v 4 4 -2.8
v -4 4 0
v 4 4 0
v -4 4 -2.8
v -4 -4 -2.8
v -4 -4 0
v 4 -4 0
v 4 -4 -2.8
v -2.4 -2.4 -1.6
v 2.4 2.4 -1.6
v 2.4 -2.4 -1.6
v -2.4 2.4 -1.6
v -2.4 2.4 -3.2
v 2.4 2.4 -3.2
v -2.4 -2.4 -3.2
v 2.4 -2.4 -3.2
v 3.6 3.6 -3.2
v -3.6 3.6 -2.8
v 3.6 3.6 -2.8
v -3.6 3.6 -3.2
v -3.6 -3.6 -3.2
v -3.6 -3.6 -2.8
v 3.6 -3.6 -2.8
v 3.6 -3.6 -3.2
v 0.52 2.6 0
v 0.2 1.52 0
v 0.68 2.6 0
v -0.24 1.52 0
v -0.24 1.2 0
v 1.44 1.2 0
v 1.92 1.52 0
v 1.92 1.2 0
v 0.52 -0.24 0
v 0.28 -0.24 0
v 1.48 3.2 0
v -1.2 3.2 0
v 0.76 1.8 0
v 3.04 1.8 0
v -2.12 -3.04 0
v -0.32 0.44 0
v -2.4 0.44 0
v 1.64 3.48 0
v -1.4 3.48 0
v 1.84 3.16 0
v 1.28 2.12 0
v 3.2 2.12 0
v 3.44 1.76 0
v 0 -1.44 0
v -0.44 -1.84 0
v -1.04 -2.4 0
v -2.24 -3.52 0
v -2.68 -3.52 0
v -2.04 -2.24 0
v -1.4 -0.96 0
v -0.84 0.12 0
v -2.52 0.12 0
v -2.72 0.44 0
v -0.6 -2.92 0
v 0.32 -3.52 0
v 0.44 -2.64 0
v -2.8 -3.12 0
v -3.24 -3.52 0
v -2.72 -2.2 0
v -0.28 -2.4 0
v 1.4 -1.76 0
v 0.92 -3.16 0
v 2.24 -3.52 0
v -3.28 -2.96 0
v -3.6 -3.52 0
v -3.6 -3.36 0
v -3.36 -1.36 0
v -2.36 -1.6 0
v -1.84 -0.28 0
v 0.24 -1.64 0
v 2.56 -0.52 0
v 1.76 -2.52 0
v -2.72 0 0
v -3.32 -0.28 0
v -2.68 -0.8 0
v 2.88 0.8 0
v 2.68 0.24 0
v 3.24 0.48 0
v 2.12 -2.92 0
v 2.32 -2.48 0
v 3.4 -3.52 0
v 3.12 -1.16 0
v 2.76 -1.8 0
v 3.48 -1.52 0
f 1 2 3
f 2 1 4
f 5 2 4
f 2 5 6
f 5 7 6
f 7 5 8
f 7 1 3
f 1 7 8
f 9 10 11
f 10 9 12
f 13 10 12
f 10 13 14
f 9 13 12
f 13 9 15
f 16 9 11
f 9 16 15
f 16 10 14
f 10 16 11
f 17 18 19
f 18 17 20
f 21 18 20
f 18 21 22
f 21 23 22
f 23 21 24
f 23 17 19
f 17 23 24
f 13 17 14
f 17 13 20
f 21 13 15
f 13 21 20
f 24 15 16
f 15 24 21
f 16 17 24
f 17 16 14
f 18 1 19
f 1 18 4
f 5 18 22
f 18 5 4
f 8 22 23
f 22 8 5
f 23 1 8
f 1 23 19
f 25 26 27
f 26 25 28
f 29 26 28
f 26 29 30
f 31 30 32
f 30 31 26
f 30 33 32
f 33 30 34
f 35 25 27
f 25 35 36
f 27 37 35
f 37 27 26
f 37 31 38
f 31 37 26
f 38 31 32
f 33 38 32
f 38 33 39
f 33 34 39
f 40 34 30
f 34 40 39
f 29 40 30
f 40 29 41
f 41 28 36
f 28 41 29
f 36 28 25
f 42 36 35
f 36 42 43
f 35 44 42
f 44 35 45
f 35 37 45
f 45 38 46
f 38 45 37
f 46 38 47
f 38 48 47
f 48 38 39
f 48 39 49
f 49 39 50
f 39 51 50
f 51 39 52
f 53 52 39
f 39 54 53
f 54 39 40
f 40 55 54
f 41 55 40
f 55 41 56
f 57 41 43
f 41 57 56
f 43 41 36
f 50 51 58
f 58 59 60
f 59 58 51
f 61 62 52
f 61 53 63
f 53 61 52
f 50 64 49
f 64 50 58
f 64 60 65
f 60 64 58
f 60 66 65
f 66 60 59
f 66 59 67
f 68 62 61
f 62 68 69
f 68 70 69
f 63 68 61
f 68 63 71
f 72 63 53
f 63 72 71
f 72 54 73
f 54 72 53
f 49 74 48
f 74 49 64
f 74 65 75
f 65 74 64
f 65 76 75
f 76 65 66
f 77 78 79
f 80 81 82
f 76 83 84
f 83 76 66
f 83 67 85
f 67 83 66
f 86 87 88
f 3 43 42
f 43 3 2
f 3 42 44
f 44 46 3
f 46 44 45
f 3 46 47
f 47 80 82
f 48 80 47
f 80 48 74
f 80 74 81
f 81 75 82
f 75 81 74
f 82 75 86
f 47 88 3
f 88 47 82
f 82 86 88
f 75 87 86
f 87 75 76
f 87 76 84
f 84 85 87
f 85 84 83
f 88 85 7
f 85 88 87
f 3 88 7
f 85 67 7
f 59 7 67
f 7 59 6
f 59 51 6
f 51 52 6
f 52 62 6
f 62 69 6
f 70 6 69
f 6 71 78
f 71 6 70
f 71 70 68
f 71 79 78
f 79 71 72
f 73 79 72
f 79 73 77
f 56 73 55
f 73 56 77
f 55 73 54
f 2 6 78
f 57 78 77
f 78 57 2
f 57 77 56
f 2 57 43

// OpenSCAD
// file: ../p/box5.scad
use <../lib.scad>
function ldraw_lib__box5() = [
// 0 Box with 5 Faces and All Edges
// 0 Name: box5.dat
// 0 Author: James Jessiman
// 0 !LDRAW_ORG Primitive UPDATE 2012-01
// 0 !LICENSE Licensed under CC BY 4.0 : see CAreadme.txt
// 
// 0 BFC CERTIFY CCW
  [0,"BFC","CERTIFY"],
  [0,"BFC","CCW"],
// 
// 0 !HISTORY 2002-04-03 [sbliss] Modified for BFC compliance
// 0 !HISTORY 2002-04-25 [PTadmin] Official Update 2002-02
// 0 !HISTORY 2007-06-24 [PTadmin] Header formatted for Contributor Agreement
// 0 !HISTORY 2008-07-01 [PTadmin] Official Update 2008-01
// 0 !HISTORY 2012-02-16 [Philo] Changed to CCW
// 0 !HISTORY 2012-03-30 [PTadmin] Official Update 2012-01
// 
// 
// 2 24 1 1 1 -1 1 1
  [2,24,1,1,1,-1,1,1],
// 2 24 -1 1 1 -1 1 -1
  [2,24,-1,1,1,-1,1,-1],
// 2 24 -1 1 -1 1 1 -1
  [2,24,-1,1,-1,1,1,-1],
// 2 24 1 1 -1 1 1 1
  [2,24,1,1,-1,1,1,1],
// 2 24 1 0 1 -1 0 1
  [2,24,1,0,1,-1,0,1],
// 2 24 -1 0 1 -1 0 -1
  [2,24,-1,0,1,-1,0,-1],
// 2 24 -1 0 -1 1 0 -1
  [2,24,-1,0,-1,1,0,-1],
// 2 24 1 0 -1 1 0 1
  [2,24,1,0,-1,1,0,1],
// 2 24 1 0 1 1 1 1
  [2,24,1,0,1,1,1,1],
// 2 24 -1 0 1 -1 1 1
  [2,24,-1,0,1,-1,1,1],
// 2 24 1 0 -1 1 1 -1
  [2,24,1,0,-1,1,1,-1],
// 2 24 -1 0 -1 -1 1 -1
  [2,24,-1,0,-1,-1,1,-1],
// 4 16 -1 1 1 1 1 1 1 1 -1 -1 1 -1
  [4,16,-1,1,1,1,1,1,1,1,-1,-1,1,-1],
// 4 16 -1 1 1 -1 0 1 1 0 1 1 1 1
  [4,16,-1,1,1,-1,0,1,1,0,1,1,1,1],
// 4 16 -1 1 -1 -1 0 -1 -1 0 1 -1 1 1
  [4,16,-1,1,-1,-1,0,-1,-1,0,1,-1,1,1],
// 4 16 1 1 -1 1 0 -1 -1 0 -1 -1 1 -1
  [4,16,1,1,-1,1,0,-1,-1,0,-1,-1,1,-1],
// 4 16 1 1 1 1 0 1 1 0 -1 1 1 -1
  [4,16,1,1,1,1,0,1,1,0,-1,1,1,-1],
];
module ldraw_lib__box5(step=0, col=false, unit=2/5, alt=false, line=0.2, solid=!$preview)
    makepoly(ldraw_lib__box5(), step=step, col=col, unit=unit, alt=alt, line=line, solid=solid);
ldraw_lib__box5(line=0.2);
// file: ../p/box4.scad
use <../lib.scad>
function ldraw_lib__box4() = [
// 0 Box with 4 Faces (2 Parallel Pairs) and All Edges
// 0 Name: box4.dat
// 0 Author: James Jessiman
// 0 !LDRAW_ORG Primitive UPDATE 2012-01
// 0 !LICENSE Licensed under CC BY 4.0 : see CAreadme.txt
// 
// 0 BFC CERTIFY CCW
  [0,"BFC","CERTIFY"],
  [0,"BFC","CCW"],
// 
// 0 !HISTORY 2002-04-03 [sbliss] Modified for BFC compliance
// 0 !HISTORY 2002-04-25 [PTadmin] Official Update 2002-02
// 0 !HISTORY 2007-06-24 [PTadmin] Header formatted for Contributor Agreement
// 0 !HISTORY 2008-07-01 [PTadmin] Official Update 2008-01
// 0 !HISTORY 2012-02-16 [Philo] Changed to CCW
// 0 !HISTORY 2012-03-30 [PTadmin] Official Update 2012-01
// 
// 
// 2 24 1 1 1 -1 1 1
  [2,24,1,1,1,-1,1,1],
// 2 24 -1 1 1 -1 1 -1
  [2,24,-1,1,1,-1,1,-1],
// 2 24 -1 1 -1 1 1 -1
  [2,24,-1,1,-1,1,1,-1],
// 2 24 1 1 -1 1 1 1
  [2,24,1,1,-1,1,1,1],
// 2 24 1 0 1 -1 0 1
  [2,24,1,0,1,-1,0,1],
// 2 24 -1 0 1 -1 0 -1
  [2,24,-1,0,1,-1,0,-1],
// 2 24 -1 0 -1 1 0 -1
  [2,24,-1,0,-1,1,0,-1],
// 2 24 1 0 -1 1 0 1
  [2,24,1,0,-1,1,0,1],
// 2 24 1 0 1 1 1 1
  [2,24,1,0,1,1,1,1],
// 2 24 -1 0 1 -1 1 1
  [2,24,-1,0,1,-1,1,1],
// 2 24 1 0 -1 1 1 -1
  [2,24,1,0,-1,1,1,-1],
// 2 24 -1 0 -1 -1 1 -1
  [2,24,-1,0,-1,-1,1,-1],
// 4 16 -1 1 1 -1 0 1 1 0 1 1 1 1
  [4,16,-1,1,1,-1,0,1,1,0,1,1,1,1],
// 4 16 -1 1 -1 -1 0 -1 -1 0 1 -1 1 1
  [4,16,-1,1,-1,-1,0,-1,-1,0,1,-1,1,1],
// 4 16 1 1 -1 1 0 -1 -1 0 -1 -1 1 -1
  [4,16,1,1,-1,1,0,-1,-1,0,-1,-1,1,-1],
// 4 16 1 1 1 1 0 1 1 0 -1 1 1 -1
  [4,16,1,1,1,1,0,1,1,0,-1,1,1,-1],
];
module ldraw_lib__box4(step=0, col=false, unit=2/5, alt=false, line=0.2, solid=!$preview)
    makepoly(ldraw_lib__box4(), step=step, col=col, unit=unit, alt=alt, line=line, solid=solid);
ldraw_lib__box4(line=0.2);
// file: s/3070bs01.scad
use <../../lib.scad>
use <../../p/box4.scad>
use <../../p/box5.scad>
function ldraw_lib__s__3070bs01() = [
// 0 ~Tile  1 x  1 with Groove without Top Face
// 0 Name: s\3070bs01.dat
// 0 Author: Chris Dee [cwdee]
// 0 !LDRAW_ORG Subpart UPDATE 2009-02
// 0 !LICENSE Licensed under CC BY 4.0 : see CAreadme.txt
// 
// 0 BFC CERTIFY CCW
  [0,"BFC","CERTIFY"],
  [0,"BFC","CCW"],
// 
// 0 !HISTORY 2009-09-03 [PTadmin] Official Update 2009-02
// 
// 
// 1 16 0 0 0 10 0 0 0 7 0 0 0 10 box4.dat
  [1,16,0,0,0,10,0,0,0,7,0,0,0,10, ldraw_lib__box4()],
// 0 BFC INVERTNEXT
  [0,"BFC","INVERTNEXT"],
// 1 16 0 8 0 6 0 0 0 -4 0 0 0 6 box5.dat
  [1,16,0,8,0,6,0,0,0,-4,0,0,0,6, ldraw_lib__box5()],
// 1 16 0 7 0 9 0 0 0 1 0 0 0 9 box4.dat
  [1,16,0,7,0,9,0,0,0,1,0,0,0,9, ldraw_lib__box4()],
// 
// 4 16 9 8 9 6 8 6 -6 8 6 -9 8 9
  [4,16,9,8,9,6,8,6,-6,8,6,-9,8,9],
// 4 16 -9 8 9 -6 8 6 -6 8 -6 -9 8 -9
  [4,16,-9,8,9,-6,8,6,-6,8,-6,-9,8,-9],
// 4 16 -9 8 -9 -6 8 -6 6 8 -6 9 8 -9
  [4,16,-9,8,-9,-6,8,-6,6,8,-6,9,8,-9],
// 4 16 9 8 -9 6 8 -6 6 8 6 9 8 9
  [4,16,9,8,-9,6,8,-6,6,8,6,9,8,9],
// 
// 4 16 10 7 10 9 7 9 -9 7 9 -10 7 10
  [4,16,10,7,10,9,7,9,-9,7,9,-10,7,10],
// 4 16 -10 7 10 -9 7 9 -9 7 -9 -10 7 -10
  [4,16,-10,7,10,-9,7,9,-9,7,-9,-10,7,-10],
// 4 16 -10 7 -10 -9 7 -9 9 7 -9 10 7 -10
  [4,16,-10,7,-10,-9,7,-9,9,7,-9,10,7,-10],
// 4 16 10 7 -10 9 7 -9 9 7 9 10 7 10
  [4,16,10,7,-10,9,7,-9,9,7,9,10,7,10],
// 0
];
module ldraw_lib__s__3070bs01(step=0, col=false, unit=2/5, alt=false, line=0.2, solid=!$preview)
    makepoly(ldraw_lib__s__3070bs01(), step=step, col=col, unit=unit, alt=alt, line=line, solid=solid);
ldraw_lib__s__3070bs01(line=0.2);
// main file
use <../lib.scad>
use <s/3070bs01.scad>
function ldraw_lib__3070bp1a() = [
// 0 Tile  1 x  1 with Yellow Lightning Bolt, Metallic Pink and White Explosion Pattern
// 0 Name: 3070bp1a.dat
// 0 Author: Takeshi Takahashi [RainbowDolphin]
// 0 !LDRAW_ORG Part UPDATE 2023-03
// 0 !LICENSE Licensed under CC BY 4.0 : see CAreadme.txt
// 
// 0 BFC CERTIFY CCW
  [0,"BFC","CERTIFY"],
  [0,"BFC","CCW"],
// 
// 0 !KEYWORDS bracelet, Bricklink 3070bpb163, Dots, Power, Set 41919
// 
// 0 !HISTORY 2023-06-24 [OrionP] Official Update 2023-03
// 
// 
// 1 16 0 0 0 1 0 0 0 1 0 0 0 1 s\3070bs01.dat
  [1,16,0,0,0,1,0,0,0,1,0,0,0,1, ldraw_lib__s__3070bs01()],
// 4 0 1.3 0 6.5 -0.6 0 3.8 0.5 0 3.8 1.7 0 6.5
  [4,0,1.3,0,6.5,-0.6,0,3.8,0.5,0,3.8,1.7,0,6.5],
// 4 0 0.5 0 3.8 -0.6 0 3.8 -0.6 0 3 3.6 0 3
  [4,0,0.5,0,3.8,-0.6,0,3.8,-0.6,0,3,3.6,0,3],
// 4 0 4.8 0 3.8 0.5 0 3.8 3.6 0 3 4.8 0 3
  [4,0,4.8,0,3.8,0.5,0,3.8,3.6,0,3,4.8,0,3],
// 4 0 1.3 0 -0.6 4.8 0 3 3.6 0 3 0.7 0 -0.6
  [4,0,1.3,0,-0.6,4.8,0,3,3.6,0,3,0.7,0,-0.6],
// 4 14 3.7 0 8 -3 0 8 1.3 0 6.5 1.7 0 6.5
  [4,14,3.7,0,8,-3,0,8,1.3,0,6.5,1.7,0,6.5],
// 4 14 1.9 0 4.5 3.7 0 8 1.7 0 6.5 0.5 0 3.8
  [4,14,1.9,0,4.5,3.7,0,8,1.7,0,6.5,0.5,0,3.8],
// 4 14 1.9 0 4.5 0.5 0 3.8 4.8 0 3.8 7.6 0 4.5
  [4,14,1.9,0,4.5,0.5,0,3.8,4.8,0,3.8,7.6,0,4.5],
// 3 14 7.6 0 4.5 4.8 0 3.8 4.8 0 3
  [3,14,7.6,0,4.5,4.8,0,3.8,4.8,0,3],
// 4 14 7.6 0 4.5 4.8 0 3 1.3 0 -0.6 -5.3 0 -7.6
  [4,14,7.6,0,4.5,4.8,0,3,1.3,0,-0.6,-5.3,0,-7.6],
// 3 14 1.3 0 -0.6 0.7 0 -0.6 -5.3 0 -7.6
  [3,14,1.3,0,-0.6,0.7,0,-0.6,-5.3,0,-7.6],
// 4 14 -0.8 0 1.1 -5.3 0 -7.6 0.7 0 -0.6 3.6 0 3
  [4,14,-0.8,0,1.1,-5.3,0,-7.6,0.7,0,-0.6,3.6,0,3],
// 4 14 -0.8 0 1.1 3.6 0 3 -0.6 0 3 -6 0 1.1
  [4,14,-0.8,0,1.1,3.6,0,3,-0.6,0,3,-6,0,1.1],
// 4 14 -6 0 1.1 -0.6 0 3 -0.6 0 3.8 -3 0 8
  [4,14,-6,0,1.1,-0.6,0,3,-0.6,0,3.8,-3,0,8],
// 3 14 -3 0 8 -0.6 0 3.8 1.3 0 6.5
  [3,14,-3,0,8,-0.6,0,3.8,1.3,0,6.5],
// 4 0 -3.5 0 8.7 -3 0 8 3.7 0 8 4.1 0 8.7
  [4,0,-3.5,0,8.7,-3,0,8,3.7,0,8,4.1,0,8.7],
// 4 0 4.6 0 7.9 4.1 0 8.7 3.7 0 8 3.2 0 5.3
  [4,0,4.6,0,7.9,4.1,0,8.7,3.7,0,8,3.2,0,5.3],
// 3 0 3.7 0 8 1.9 0 4.5 3.2 0 5.3
  [3,0,3.7,0,8,1.9,0,4.5,3.2,0,5.3],
// 4 0 3.2 0 5.3 1.9 0 4.5 7.6 0 4.5 8 0 5.3
  [4,0,3.2,0,5.3,1.9,0,4.5,7.6,0,4.5,8,0,5.3],
// 3 0 8 0 5.3 7.6 0 4.5 8.6 0 4.4
  [3,0,8,0,5.3,7.6,0,4.5,8.6,0,4.4],
// 4 0 0 0 -3.6 8.6 0 4.4 7.6 0 4.5 -5.3 0 -7.6
  [4,0,0,0,-3.6,8.6,0,4.4,7.6,0,4.5,-5.3,0,-7.6],
// 3 0 0 0 -3.6 -5.3 0 -7.6 -1.1 0 -4.6
  [3,0,0,0,-3.6,-5.3,0,-7.6,-1.1,0,-4.6],
// 3 0 -1.1 0 -4.6 -5.3 0 -7.6 -2.6 0 -6
  [3,0,-1.1,0,-4.6,-5.3,0,-7.6,-2.6,0,-6],
// 4 0 -5.6 0 -8.8 -2.6 0 -6 -5.3 0 -7.6 -6.7 0 -8.8
  [4,0,-5.6,0,-8.8,-2.6,0,-6,-5.3,0,-7.6,-6.7,0,-8.8],
// 3 0 -5.1 0 -5.6 -6.7 0 -8.8 -5.3 0 -7.6
  [3,0,-5.1,0,-5.6,-6.7,0,-8.8,-5.3,0,-7.6],
// 4 0 -3.5 0 -2.4 -5.1 0 -5.6 -5.3 0 -7.6 -0.8 0 1.1
  [4,0,-3.5,0,-2.4,-5.1,0,-5.6,-5.3,0,-7.6,-0.8,0,1.1],
// 3 0 -0.8 0 1.1 -2.1 0 0.3 -3.5 0 -2.4
  [3,0,-0.8,0,1.1,-2.1,0,0.3,-3.5,0,-2.4],
// 4 0 -2.1 0 0.3 -0.8 0 1.1 -6 0 1.1 -6.3 0 0.3
  [4,0,-2.1,0,0.3,-0.8,0,1.1,-6,0,1.1,-6.3,0,0.3],
// 4 0 -6.8 0 1.1 -6.3 0 0.3 -6 0 1.1 -3.5 0 8.7
  [4,0,-6.8,0,1.1,-6.3,0,0.3,-6,0,1.1,-3.5,0,8.7],
// 3 0 -3.5 0 8.7 -6 0 1.1 -3 0 8
  [3,0,-3.5,0,8.7,-6,0,1.1,-3,0,8],
// 3 14 -2.6 0 -6 -5.6 0 -8.8 -1.5 0 -7.3
  [3,14,-2.6,0,-6,-5.6,0,-8.8,-1.5,0,-7.3],
// 4 14 -1.5 0 -7.3 -5.6 0 -8.8 0.8 0 -8.8 1.1 0 -6.6
  [4,14,-1.5,0,-7.3,-5.6,0,-8.8,0.8,0,-8.8,1.1,0,-6.6],
// 3 15 -7 0 -7.8 -8.1 0 -8.8 -6.7 0 -8.8
  [3,15,-7,0,-7.8,-8.1,0,-8.8,-6.7,0,-8.8],
// 4 15 -7 0 -7.8 -6.7 0 -8.8 -5.1 0 -5.6 -6.8 0 -5.5
  [4,15,-7,0,-7.8,-6.7,0,-8.8,-5.1,0,-5.6,-6.8,0,-5.5],
// 4 15 -0.7 0 -6 -1.1 0 -4.6 -2.6 0 -6 -1.5 0 -7.3
  [4,15,-0.7,0,-6,-1.1,0,-4.6,-2.6,0,-6,-1.5,0,-7.3],
// 4 15 -0.7 0 -6 -1.5 0 -7.3 1.1 0 -6.6 3.5 0 -4.4
  [4,15,-0.7,0,-6,-1.5,0,-7.3,1.1,0,-6.6,3.5,0,-4.4],
// 4 15 2.3 0 -7.9 3.5 0 -4.4 1.1 0 -6.6 0.8 0 -8.8
  [4,15,2.3,0,-7.9,3.5,0,-4.4,1.1,0,-6.6,0.8,0,-8.8],
// 3 15 2.3 0 -7.9 0.8 0 -8.8 5.6 0 -8.8
  [3,15,2.3,0,-7.9,0.8,0,-8.8,5.6,0,-8.8],
// 4 10049 -8.2 0 -7.4 -9 0 -8.8 -8.1 0 -8.8 -7 0 -7.8
  [4,10049,-8.2,0,-7.4,-9,0,-8.8,-8.1,0,-8.8,-7,0,-7.8],
// 3 10049 -8.2 0 -7.4 -9 0 -8.4 -9 0 -8.8
  [3,10049,-8.2,0,-7.4,-9,0,-8.4,-9,0,-8.8],
// 4 10049 -8.2 0 -7.4 -7 0 -7.8 -6.8 0 -5.5 -8.4 0 -3.4
  [4,10049,-8.2,0,-7.4,-7,0,-7.8,-6.8,0,-5.5,-8.4,0,-3.4],
// 4 10049 -5.9 0 -4 -8.4 0 -3.4 -6.8 0 -5.5 -5.1 0 -5.6
  [4,10049,-5.9,0,-4,-8.4,0,-3.4,-6.8,0,-5.5,-5.1,0,-5.6],
// 4 10049 -5.9 0 -4 -5.1 0 -5.6 -3.5 0 -2.4 -4.6 0 -.7
  [4,10049,-5.9,0,-4,-5.1,0,-5.6,-3.5,0,-2.4,-4.6,0,-.7],
// 4 10049 0 0 -3.6 -1.1 0 -4.6 -.7 0 -6 .6 0 -4.1
  [4,10049,0,0,-3.6,-1.1,0,-4.6,-.7,0,-6,.6,0,-4.1],
// 4 10049 .6 0 -4.1 -.7 0 -6 3.5 0 -4.4 6.4 0 -1.3
  [4,10049,.6,0,-4.1,-.7,0,-6,3.5,0,-4.4,6.4,0,-1.3],
// 4 10049 4.4 0 -6.3 6.4 0 -1.3 3.5 0 -4.4 2.3 0 -7.9
  [4,10049,4.4,0,-6.3,6.4,0,-1.3,3.5,0,-4.4,2.3,0,-7.9],
// 3 10049 -6.8 0 0 -8.3 0 -.7 -6.7 0 -2
  [3,10049,-6.8,0,0,-8.3,0,-.7,-6.7,0,-2],
// 3 10049 7.2 0 2 6.7 0 .6 8.1 0 1.2
  [3,10049,7.2,0,2,6.7,0,.6,8.1,0,1.2],
// 4 10049 5.8 0 -6.2 4.4 0 -6.3 2.3 0 -7.9 5.3 0 -7.3
  [4,10049,5.8,0,-6.2,4.4,0,-6.3,2.3,0,-7.9,5.3,0,-7.3],
// 4 10049 5.3 0 -7.3 2.3 0 -7.9 5.6 0 -8.8 8.5 0 -8.8
  [4,10049,5.3,0,-7.3,2.3,0,-7.9,5.6,0,-8.8,8.5,0,-8.8],
// 3 10049 7.8 0 -2.9 6.9 0 -4.5 8.7 0 -3.8
  [3,10049,7.8,0,-2.9,6.9,0,-4.5,8.7,0,-3.8],
// 4 16 10 0 10 -10 0 10 -3.5 0 8.7 4.1 0 8.7
  [4,16,10,0,10,-10,0,10,-3.5,0,8.7,4.1,0,8.7],
// 3 16 10 0 10 4.1 0 8.7 4.6 0 7.9
  [3,16,10,0,10,4.1,0,8.7,4.6,0,7.9],
// 4 16 10 0 10 4.6 0 7.9 3.2 0 5.3 8 0 5.3
  [4,16,10,0,10,4.6,0,7.9,3.2,0,5.3,8,0,5.3],
// 3 16 10 0 10 8 0 5.3 8.6 0 4.4
  [3,16,10,0,10,8,0,5.3,8.6,0,4.4],
// 3 16 8.6 0 4.4 7.2 0 2 8.1 0 1.2
  [3,16,8.6,0,4.4,7.2,0,2,8.1,0,1.2],
// 4 16 7.2 0 2 8.6 0 4.4 0 0 -3.6 0.6 0 -4.1
  [4,16,7.2,0,2,8.6,0,4.4,0,0,-3.6,0.6,0,-4.1],
// 3 16 7.2 0 2 0.6 0 -4.1 6.7 0 0.6
  [3,16,7.2,0,2,0.6,0,-4.1,6.7,0,0.6],
// 4 16 6.7 0 0.6 0.6 0 -4.1 6.4 0 -1.3 8.1 0 1.2
  [4,16,6.7,0,0.6,0.6,0,-4.1,6.4,0,-1.3,8.1,0,1.2],
// 3 16 8.1 0 1.2 6.4 0 -1.3 7.8 0 -2.9
  [3,16,8.1,0,1.2,6.4,0,-1.3,7.8,0,-2.9],
// 4 16 8.6 0 4.4 8.1 0 1.2 8.7 0 -3.8 10 0 10
  [4,16,8.6,0,4.4,8.1,0,1.2,8.7,0,-3.8,10,0,10],
// 3 16 8.1 0 1.2 7.8 0 -2.9 8.7 0 -3.8
  [3,16,8.1,0,1.2,7.8,0,-2.9,8.7,0,-3.8],
// 4 16 6.9 0 -4.5 7.8 0 -2.9 6.4 0 -1.3 4.4 0 -6.3
  [4,16,6.9,0,-4.5,7.8,0,-2.9,6.4,0,-1.3,4.4,0,-6.3],
// 3 16 6.9 0 -4.5 4.4 0 -6.3 5.8 0 -6.2
  [3,16,6.9,0,-4.5,4.4,0,-6.3,5.8,0,-6.2],
// 4 16 8.5 0 -8.8 6.9 0 -4.5 5.8 0 -6.2 5.3 0 -7.3
  [4,16,8.5,0,-8.8,6.9,0,-4.5,5.8,0,-6.2,5.3,0,-7.3],
// 4 16 8.7 0 -3.8 6.9 0 -4.5 8.5 0 -8.8 10 0 -10
  [4,16,8.7,0,-3.8,6.9,0,-4.5,8.5,0,-8.8,10,0,-10],
// 3 16 10 0 10 8.7 0 -3.8 10 0 -10
  [3,16,10,0,10,8.7,0,-3.8,10,0,-10],
// 3 16 8.5 0 -8.8 5.6 0 -8.8 10 0 -10
  [3,16,8.5,0,-8.8,5.6,0,-8.8,10,0,-10],
// 4 16 10 0 -10 5.6 0 -8.8 0.8 0 -8.8 -10 0 -10
  [4,16,10,0,-10,5.6,0,-8.8,0.8,0,-8.8,-10,0,-10],
// 3 16 0.8 0 -8.8 -5.6 0 -8.8 -10 0 -10
  [3,16,0.8,0,-8.8,-5.6,0,-8.8,-10,0,-10],
// 3 16 -5.6 0 -8.8 -6.7 0 -8.8 -10 0 -10
  [3,16,-5.6,0,-8.8,-6.7,0,-8.8,-10,0,-10],
// 3 16 -6.7 0 -8.8 -8.1 0 -8.8 -10 0 -10
  [3,16,-6.7,0,-8.8,-8.1,0,-8.8,-10,0,-10],
// 3 16 -8.1 0 -8.8 -9 0 -8.8 -10 0 -10
  [3,16,-8.1,0,-8.8,-9,0,-8.8,-10,0,-10],
// 3 16 -9 0 -8.4 -10 0 -10 -9 0 -8.8
  [3,16,-9,0,-8.4,-10,0,-10,-9,0,-8.8],
// 4 16 -10 0 -10 -9 0 -8.4 -8.4 0 -3.4 -8.3 0 -0.7
  [4,16,-10,0,-10,-9,0,-8.4,-8.4,0,-3.4,-8.3,0,-0.7],
// 3 16 -8.4 0 -3.4 -9 0 -8.4 -8.2 0 -7.4
  [3,16,-8.4,0,-3.4,-9,0,-8.4,-8.2,0,-7.4],
// 4 16 -6.7 0 -2 -8.3 0 -0.7 -8.4 0 -3.4 -5.9 0 -4
  [4,16,-6.7,0,-2,-8.3,0,-0.7,-8.4,0,-3.4,-5.9,0,-4],
// 4 16 -6.7 0 -2 -5.9 0 -4 -4.6 0 -0.7 -6.8 0 0
  [4,16,-6.7,0,-2,-5.9,0,-4,-4.6,0,-0.7,-6.8,0,0],
// 4 16 -6.3 0 0.3 -6.8 0 0 -4.6 0 -0.7 -2.1 0 0.3
  [4,16,-6.3,0,0.3,-6.8,0,0,-4.6,0,-0.7,-2.1,0,0.3],
// 3 16 -2.1 0 0.3 -4.6 0 -0.7 -3.5 0 -2.4
  [3,16,-2.1,0,0.3,-4.6,0,-0.7,-3.5,0,-2.4],
// 3 16 -10 0 10 -10 0 -10 -8.3 0 -0.7
  [3,16,-10,0,10,-10,0,-10,-8.3,0,-0.7],
// 4 16 -6.8 0 1.1 -10 0 10 -8.3 0 -0.7 -6.8 0 0
  [4,16,-6.8,0,1.1,-10,0,10,-8.3,0,-0.7,-6.8,0,0],
// 3 16 -6.8 0 1.1 -6.8 0 0 -6.3 0 0.3
  [3,16,-6.8,0,1.1,-6.8,0,0,-6.3,0,0.3],
// 3 16 -10 0 10 -6.8 0 1.1 -3.5 0 8.7
  [3,16,-10,0,10,-6.8,0,1.1,-3.5,0,8.7],
];
module ldraw_lib__3070bp1a(step=0, col=false, unit=2/5, alt=false, line=0.2, solid=!$preview)
    makepoly(ldraw_lib__3070bp1a(), step=step, col=col, unit=unit, alt=alt, line=line, solid=solid);
ldraw_lib__3070bp1a(line=0.2);
